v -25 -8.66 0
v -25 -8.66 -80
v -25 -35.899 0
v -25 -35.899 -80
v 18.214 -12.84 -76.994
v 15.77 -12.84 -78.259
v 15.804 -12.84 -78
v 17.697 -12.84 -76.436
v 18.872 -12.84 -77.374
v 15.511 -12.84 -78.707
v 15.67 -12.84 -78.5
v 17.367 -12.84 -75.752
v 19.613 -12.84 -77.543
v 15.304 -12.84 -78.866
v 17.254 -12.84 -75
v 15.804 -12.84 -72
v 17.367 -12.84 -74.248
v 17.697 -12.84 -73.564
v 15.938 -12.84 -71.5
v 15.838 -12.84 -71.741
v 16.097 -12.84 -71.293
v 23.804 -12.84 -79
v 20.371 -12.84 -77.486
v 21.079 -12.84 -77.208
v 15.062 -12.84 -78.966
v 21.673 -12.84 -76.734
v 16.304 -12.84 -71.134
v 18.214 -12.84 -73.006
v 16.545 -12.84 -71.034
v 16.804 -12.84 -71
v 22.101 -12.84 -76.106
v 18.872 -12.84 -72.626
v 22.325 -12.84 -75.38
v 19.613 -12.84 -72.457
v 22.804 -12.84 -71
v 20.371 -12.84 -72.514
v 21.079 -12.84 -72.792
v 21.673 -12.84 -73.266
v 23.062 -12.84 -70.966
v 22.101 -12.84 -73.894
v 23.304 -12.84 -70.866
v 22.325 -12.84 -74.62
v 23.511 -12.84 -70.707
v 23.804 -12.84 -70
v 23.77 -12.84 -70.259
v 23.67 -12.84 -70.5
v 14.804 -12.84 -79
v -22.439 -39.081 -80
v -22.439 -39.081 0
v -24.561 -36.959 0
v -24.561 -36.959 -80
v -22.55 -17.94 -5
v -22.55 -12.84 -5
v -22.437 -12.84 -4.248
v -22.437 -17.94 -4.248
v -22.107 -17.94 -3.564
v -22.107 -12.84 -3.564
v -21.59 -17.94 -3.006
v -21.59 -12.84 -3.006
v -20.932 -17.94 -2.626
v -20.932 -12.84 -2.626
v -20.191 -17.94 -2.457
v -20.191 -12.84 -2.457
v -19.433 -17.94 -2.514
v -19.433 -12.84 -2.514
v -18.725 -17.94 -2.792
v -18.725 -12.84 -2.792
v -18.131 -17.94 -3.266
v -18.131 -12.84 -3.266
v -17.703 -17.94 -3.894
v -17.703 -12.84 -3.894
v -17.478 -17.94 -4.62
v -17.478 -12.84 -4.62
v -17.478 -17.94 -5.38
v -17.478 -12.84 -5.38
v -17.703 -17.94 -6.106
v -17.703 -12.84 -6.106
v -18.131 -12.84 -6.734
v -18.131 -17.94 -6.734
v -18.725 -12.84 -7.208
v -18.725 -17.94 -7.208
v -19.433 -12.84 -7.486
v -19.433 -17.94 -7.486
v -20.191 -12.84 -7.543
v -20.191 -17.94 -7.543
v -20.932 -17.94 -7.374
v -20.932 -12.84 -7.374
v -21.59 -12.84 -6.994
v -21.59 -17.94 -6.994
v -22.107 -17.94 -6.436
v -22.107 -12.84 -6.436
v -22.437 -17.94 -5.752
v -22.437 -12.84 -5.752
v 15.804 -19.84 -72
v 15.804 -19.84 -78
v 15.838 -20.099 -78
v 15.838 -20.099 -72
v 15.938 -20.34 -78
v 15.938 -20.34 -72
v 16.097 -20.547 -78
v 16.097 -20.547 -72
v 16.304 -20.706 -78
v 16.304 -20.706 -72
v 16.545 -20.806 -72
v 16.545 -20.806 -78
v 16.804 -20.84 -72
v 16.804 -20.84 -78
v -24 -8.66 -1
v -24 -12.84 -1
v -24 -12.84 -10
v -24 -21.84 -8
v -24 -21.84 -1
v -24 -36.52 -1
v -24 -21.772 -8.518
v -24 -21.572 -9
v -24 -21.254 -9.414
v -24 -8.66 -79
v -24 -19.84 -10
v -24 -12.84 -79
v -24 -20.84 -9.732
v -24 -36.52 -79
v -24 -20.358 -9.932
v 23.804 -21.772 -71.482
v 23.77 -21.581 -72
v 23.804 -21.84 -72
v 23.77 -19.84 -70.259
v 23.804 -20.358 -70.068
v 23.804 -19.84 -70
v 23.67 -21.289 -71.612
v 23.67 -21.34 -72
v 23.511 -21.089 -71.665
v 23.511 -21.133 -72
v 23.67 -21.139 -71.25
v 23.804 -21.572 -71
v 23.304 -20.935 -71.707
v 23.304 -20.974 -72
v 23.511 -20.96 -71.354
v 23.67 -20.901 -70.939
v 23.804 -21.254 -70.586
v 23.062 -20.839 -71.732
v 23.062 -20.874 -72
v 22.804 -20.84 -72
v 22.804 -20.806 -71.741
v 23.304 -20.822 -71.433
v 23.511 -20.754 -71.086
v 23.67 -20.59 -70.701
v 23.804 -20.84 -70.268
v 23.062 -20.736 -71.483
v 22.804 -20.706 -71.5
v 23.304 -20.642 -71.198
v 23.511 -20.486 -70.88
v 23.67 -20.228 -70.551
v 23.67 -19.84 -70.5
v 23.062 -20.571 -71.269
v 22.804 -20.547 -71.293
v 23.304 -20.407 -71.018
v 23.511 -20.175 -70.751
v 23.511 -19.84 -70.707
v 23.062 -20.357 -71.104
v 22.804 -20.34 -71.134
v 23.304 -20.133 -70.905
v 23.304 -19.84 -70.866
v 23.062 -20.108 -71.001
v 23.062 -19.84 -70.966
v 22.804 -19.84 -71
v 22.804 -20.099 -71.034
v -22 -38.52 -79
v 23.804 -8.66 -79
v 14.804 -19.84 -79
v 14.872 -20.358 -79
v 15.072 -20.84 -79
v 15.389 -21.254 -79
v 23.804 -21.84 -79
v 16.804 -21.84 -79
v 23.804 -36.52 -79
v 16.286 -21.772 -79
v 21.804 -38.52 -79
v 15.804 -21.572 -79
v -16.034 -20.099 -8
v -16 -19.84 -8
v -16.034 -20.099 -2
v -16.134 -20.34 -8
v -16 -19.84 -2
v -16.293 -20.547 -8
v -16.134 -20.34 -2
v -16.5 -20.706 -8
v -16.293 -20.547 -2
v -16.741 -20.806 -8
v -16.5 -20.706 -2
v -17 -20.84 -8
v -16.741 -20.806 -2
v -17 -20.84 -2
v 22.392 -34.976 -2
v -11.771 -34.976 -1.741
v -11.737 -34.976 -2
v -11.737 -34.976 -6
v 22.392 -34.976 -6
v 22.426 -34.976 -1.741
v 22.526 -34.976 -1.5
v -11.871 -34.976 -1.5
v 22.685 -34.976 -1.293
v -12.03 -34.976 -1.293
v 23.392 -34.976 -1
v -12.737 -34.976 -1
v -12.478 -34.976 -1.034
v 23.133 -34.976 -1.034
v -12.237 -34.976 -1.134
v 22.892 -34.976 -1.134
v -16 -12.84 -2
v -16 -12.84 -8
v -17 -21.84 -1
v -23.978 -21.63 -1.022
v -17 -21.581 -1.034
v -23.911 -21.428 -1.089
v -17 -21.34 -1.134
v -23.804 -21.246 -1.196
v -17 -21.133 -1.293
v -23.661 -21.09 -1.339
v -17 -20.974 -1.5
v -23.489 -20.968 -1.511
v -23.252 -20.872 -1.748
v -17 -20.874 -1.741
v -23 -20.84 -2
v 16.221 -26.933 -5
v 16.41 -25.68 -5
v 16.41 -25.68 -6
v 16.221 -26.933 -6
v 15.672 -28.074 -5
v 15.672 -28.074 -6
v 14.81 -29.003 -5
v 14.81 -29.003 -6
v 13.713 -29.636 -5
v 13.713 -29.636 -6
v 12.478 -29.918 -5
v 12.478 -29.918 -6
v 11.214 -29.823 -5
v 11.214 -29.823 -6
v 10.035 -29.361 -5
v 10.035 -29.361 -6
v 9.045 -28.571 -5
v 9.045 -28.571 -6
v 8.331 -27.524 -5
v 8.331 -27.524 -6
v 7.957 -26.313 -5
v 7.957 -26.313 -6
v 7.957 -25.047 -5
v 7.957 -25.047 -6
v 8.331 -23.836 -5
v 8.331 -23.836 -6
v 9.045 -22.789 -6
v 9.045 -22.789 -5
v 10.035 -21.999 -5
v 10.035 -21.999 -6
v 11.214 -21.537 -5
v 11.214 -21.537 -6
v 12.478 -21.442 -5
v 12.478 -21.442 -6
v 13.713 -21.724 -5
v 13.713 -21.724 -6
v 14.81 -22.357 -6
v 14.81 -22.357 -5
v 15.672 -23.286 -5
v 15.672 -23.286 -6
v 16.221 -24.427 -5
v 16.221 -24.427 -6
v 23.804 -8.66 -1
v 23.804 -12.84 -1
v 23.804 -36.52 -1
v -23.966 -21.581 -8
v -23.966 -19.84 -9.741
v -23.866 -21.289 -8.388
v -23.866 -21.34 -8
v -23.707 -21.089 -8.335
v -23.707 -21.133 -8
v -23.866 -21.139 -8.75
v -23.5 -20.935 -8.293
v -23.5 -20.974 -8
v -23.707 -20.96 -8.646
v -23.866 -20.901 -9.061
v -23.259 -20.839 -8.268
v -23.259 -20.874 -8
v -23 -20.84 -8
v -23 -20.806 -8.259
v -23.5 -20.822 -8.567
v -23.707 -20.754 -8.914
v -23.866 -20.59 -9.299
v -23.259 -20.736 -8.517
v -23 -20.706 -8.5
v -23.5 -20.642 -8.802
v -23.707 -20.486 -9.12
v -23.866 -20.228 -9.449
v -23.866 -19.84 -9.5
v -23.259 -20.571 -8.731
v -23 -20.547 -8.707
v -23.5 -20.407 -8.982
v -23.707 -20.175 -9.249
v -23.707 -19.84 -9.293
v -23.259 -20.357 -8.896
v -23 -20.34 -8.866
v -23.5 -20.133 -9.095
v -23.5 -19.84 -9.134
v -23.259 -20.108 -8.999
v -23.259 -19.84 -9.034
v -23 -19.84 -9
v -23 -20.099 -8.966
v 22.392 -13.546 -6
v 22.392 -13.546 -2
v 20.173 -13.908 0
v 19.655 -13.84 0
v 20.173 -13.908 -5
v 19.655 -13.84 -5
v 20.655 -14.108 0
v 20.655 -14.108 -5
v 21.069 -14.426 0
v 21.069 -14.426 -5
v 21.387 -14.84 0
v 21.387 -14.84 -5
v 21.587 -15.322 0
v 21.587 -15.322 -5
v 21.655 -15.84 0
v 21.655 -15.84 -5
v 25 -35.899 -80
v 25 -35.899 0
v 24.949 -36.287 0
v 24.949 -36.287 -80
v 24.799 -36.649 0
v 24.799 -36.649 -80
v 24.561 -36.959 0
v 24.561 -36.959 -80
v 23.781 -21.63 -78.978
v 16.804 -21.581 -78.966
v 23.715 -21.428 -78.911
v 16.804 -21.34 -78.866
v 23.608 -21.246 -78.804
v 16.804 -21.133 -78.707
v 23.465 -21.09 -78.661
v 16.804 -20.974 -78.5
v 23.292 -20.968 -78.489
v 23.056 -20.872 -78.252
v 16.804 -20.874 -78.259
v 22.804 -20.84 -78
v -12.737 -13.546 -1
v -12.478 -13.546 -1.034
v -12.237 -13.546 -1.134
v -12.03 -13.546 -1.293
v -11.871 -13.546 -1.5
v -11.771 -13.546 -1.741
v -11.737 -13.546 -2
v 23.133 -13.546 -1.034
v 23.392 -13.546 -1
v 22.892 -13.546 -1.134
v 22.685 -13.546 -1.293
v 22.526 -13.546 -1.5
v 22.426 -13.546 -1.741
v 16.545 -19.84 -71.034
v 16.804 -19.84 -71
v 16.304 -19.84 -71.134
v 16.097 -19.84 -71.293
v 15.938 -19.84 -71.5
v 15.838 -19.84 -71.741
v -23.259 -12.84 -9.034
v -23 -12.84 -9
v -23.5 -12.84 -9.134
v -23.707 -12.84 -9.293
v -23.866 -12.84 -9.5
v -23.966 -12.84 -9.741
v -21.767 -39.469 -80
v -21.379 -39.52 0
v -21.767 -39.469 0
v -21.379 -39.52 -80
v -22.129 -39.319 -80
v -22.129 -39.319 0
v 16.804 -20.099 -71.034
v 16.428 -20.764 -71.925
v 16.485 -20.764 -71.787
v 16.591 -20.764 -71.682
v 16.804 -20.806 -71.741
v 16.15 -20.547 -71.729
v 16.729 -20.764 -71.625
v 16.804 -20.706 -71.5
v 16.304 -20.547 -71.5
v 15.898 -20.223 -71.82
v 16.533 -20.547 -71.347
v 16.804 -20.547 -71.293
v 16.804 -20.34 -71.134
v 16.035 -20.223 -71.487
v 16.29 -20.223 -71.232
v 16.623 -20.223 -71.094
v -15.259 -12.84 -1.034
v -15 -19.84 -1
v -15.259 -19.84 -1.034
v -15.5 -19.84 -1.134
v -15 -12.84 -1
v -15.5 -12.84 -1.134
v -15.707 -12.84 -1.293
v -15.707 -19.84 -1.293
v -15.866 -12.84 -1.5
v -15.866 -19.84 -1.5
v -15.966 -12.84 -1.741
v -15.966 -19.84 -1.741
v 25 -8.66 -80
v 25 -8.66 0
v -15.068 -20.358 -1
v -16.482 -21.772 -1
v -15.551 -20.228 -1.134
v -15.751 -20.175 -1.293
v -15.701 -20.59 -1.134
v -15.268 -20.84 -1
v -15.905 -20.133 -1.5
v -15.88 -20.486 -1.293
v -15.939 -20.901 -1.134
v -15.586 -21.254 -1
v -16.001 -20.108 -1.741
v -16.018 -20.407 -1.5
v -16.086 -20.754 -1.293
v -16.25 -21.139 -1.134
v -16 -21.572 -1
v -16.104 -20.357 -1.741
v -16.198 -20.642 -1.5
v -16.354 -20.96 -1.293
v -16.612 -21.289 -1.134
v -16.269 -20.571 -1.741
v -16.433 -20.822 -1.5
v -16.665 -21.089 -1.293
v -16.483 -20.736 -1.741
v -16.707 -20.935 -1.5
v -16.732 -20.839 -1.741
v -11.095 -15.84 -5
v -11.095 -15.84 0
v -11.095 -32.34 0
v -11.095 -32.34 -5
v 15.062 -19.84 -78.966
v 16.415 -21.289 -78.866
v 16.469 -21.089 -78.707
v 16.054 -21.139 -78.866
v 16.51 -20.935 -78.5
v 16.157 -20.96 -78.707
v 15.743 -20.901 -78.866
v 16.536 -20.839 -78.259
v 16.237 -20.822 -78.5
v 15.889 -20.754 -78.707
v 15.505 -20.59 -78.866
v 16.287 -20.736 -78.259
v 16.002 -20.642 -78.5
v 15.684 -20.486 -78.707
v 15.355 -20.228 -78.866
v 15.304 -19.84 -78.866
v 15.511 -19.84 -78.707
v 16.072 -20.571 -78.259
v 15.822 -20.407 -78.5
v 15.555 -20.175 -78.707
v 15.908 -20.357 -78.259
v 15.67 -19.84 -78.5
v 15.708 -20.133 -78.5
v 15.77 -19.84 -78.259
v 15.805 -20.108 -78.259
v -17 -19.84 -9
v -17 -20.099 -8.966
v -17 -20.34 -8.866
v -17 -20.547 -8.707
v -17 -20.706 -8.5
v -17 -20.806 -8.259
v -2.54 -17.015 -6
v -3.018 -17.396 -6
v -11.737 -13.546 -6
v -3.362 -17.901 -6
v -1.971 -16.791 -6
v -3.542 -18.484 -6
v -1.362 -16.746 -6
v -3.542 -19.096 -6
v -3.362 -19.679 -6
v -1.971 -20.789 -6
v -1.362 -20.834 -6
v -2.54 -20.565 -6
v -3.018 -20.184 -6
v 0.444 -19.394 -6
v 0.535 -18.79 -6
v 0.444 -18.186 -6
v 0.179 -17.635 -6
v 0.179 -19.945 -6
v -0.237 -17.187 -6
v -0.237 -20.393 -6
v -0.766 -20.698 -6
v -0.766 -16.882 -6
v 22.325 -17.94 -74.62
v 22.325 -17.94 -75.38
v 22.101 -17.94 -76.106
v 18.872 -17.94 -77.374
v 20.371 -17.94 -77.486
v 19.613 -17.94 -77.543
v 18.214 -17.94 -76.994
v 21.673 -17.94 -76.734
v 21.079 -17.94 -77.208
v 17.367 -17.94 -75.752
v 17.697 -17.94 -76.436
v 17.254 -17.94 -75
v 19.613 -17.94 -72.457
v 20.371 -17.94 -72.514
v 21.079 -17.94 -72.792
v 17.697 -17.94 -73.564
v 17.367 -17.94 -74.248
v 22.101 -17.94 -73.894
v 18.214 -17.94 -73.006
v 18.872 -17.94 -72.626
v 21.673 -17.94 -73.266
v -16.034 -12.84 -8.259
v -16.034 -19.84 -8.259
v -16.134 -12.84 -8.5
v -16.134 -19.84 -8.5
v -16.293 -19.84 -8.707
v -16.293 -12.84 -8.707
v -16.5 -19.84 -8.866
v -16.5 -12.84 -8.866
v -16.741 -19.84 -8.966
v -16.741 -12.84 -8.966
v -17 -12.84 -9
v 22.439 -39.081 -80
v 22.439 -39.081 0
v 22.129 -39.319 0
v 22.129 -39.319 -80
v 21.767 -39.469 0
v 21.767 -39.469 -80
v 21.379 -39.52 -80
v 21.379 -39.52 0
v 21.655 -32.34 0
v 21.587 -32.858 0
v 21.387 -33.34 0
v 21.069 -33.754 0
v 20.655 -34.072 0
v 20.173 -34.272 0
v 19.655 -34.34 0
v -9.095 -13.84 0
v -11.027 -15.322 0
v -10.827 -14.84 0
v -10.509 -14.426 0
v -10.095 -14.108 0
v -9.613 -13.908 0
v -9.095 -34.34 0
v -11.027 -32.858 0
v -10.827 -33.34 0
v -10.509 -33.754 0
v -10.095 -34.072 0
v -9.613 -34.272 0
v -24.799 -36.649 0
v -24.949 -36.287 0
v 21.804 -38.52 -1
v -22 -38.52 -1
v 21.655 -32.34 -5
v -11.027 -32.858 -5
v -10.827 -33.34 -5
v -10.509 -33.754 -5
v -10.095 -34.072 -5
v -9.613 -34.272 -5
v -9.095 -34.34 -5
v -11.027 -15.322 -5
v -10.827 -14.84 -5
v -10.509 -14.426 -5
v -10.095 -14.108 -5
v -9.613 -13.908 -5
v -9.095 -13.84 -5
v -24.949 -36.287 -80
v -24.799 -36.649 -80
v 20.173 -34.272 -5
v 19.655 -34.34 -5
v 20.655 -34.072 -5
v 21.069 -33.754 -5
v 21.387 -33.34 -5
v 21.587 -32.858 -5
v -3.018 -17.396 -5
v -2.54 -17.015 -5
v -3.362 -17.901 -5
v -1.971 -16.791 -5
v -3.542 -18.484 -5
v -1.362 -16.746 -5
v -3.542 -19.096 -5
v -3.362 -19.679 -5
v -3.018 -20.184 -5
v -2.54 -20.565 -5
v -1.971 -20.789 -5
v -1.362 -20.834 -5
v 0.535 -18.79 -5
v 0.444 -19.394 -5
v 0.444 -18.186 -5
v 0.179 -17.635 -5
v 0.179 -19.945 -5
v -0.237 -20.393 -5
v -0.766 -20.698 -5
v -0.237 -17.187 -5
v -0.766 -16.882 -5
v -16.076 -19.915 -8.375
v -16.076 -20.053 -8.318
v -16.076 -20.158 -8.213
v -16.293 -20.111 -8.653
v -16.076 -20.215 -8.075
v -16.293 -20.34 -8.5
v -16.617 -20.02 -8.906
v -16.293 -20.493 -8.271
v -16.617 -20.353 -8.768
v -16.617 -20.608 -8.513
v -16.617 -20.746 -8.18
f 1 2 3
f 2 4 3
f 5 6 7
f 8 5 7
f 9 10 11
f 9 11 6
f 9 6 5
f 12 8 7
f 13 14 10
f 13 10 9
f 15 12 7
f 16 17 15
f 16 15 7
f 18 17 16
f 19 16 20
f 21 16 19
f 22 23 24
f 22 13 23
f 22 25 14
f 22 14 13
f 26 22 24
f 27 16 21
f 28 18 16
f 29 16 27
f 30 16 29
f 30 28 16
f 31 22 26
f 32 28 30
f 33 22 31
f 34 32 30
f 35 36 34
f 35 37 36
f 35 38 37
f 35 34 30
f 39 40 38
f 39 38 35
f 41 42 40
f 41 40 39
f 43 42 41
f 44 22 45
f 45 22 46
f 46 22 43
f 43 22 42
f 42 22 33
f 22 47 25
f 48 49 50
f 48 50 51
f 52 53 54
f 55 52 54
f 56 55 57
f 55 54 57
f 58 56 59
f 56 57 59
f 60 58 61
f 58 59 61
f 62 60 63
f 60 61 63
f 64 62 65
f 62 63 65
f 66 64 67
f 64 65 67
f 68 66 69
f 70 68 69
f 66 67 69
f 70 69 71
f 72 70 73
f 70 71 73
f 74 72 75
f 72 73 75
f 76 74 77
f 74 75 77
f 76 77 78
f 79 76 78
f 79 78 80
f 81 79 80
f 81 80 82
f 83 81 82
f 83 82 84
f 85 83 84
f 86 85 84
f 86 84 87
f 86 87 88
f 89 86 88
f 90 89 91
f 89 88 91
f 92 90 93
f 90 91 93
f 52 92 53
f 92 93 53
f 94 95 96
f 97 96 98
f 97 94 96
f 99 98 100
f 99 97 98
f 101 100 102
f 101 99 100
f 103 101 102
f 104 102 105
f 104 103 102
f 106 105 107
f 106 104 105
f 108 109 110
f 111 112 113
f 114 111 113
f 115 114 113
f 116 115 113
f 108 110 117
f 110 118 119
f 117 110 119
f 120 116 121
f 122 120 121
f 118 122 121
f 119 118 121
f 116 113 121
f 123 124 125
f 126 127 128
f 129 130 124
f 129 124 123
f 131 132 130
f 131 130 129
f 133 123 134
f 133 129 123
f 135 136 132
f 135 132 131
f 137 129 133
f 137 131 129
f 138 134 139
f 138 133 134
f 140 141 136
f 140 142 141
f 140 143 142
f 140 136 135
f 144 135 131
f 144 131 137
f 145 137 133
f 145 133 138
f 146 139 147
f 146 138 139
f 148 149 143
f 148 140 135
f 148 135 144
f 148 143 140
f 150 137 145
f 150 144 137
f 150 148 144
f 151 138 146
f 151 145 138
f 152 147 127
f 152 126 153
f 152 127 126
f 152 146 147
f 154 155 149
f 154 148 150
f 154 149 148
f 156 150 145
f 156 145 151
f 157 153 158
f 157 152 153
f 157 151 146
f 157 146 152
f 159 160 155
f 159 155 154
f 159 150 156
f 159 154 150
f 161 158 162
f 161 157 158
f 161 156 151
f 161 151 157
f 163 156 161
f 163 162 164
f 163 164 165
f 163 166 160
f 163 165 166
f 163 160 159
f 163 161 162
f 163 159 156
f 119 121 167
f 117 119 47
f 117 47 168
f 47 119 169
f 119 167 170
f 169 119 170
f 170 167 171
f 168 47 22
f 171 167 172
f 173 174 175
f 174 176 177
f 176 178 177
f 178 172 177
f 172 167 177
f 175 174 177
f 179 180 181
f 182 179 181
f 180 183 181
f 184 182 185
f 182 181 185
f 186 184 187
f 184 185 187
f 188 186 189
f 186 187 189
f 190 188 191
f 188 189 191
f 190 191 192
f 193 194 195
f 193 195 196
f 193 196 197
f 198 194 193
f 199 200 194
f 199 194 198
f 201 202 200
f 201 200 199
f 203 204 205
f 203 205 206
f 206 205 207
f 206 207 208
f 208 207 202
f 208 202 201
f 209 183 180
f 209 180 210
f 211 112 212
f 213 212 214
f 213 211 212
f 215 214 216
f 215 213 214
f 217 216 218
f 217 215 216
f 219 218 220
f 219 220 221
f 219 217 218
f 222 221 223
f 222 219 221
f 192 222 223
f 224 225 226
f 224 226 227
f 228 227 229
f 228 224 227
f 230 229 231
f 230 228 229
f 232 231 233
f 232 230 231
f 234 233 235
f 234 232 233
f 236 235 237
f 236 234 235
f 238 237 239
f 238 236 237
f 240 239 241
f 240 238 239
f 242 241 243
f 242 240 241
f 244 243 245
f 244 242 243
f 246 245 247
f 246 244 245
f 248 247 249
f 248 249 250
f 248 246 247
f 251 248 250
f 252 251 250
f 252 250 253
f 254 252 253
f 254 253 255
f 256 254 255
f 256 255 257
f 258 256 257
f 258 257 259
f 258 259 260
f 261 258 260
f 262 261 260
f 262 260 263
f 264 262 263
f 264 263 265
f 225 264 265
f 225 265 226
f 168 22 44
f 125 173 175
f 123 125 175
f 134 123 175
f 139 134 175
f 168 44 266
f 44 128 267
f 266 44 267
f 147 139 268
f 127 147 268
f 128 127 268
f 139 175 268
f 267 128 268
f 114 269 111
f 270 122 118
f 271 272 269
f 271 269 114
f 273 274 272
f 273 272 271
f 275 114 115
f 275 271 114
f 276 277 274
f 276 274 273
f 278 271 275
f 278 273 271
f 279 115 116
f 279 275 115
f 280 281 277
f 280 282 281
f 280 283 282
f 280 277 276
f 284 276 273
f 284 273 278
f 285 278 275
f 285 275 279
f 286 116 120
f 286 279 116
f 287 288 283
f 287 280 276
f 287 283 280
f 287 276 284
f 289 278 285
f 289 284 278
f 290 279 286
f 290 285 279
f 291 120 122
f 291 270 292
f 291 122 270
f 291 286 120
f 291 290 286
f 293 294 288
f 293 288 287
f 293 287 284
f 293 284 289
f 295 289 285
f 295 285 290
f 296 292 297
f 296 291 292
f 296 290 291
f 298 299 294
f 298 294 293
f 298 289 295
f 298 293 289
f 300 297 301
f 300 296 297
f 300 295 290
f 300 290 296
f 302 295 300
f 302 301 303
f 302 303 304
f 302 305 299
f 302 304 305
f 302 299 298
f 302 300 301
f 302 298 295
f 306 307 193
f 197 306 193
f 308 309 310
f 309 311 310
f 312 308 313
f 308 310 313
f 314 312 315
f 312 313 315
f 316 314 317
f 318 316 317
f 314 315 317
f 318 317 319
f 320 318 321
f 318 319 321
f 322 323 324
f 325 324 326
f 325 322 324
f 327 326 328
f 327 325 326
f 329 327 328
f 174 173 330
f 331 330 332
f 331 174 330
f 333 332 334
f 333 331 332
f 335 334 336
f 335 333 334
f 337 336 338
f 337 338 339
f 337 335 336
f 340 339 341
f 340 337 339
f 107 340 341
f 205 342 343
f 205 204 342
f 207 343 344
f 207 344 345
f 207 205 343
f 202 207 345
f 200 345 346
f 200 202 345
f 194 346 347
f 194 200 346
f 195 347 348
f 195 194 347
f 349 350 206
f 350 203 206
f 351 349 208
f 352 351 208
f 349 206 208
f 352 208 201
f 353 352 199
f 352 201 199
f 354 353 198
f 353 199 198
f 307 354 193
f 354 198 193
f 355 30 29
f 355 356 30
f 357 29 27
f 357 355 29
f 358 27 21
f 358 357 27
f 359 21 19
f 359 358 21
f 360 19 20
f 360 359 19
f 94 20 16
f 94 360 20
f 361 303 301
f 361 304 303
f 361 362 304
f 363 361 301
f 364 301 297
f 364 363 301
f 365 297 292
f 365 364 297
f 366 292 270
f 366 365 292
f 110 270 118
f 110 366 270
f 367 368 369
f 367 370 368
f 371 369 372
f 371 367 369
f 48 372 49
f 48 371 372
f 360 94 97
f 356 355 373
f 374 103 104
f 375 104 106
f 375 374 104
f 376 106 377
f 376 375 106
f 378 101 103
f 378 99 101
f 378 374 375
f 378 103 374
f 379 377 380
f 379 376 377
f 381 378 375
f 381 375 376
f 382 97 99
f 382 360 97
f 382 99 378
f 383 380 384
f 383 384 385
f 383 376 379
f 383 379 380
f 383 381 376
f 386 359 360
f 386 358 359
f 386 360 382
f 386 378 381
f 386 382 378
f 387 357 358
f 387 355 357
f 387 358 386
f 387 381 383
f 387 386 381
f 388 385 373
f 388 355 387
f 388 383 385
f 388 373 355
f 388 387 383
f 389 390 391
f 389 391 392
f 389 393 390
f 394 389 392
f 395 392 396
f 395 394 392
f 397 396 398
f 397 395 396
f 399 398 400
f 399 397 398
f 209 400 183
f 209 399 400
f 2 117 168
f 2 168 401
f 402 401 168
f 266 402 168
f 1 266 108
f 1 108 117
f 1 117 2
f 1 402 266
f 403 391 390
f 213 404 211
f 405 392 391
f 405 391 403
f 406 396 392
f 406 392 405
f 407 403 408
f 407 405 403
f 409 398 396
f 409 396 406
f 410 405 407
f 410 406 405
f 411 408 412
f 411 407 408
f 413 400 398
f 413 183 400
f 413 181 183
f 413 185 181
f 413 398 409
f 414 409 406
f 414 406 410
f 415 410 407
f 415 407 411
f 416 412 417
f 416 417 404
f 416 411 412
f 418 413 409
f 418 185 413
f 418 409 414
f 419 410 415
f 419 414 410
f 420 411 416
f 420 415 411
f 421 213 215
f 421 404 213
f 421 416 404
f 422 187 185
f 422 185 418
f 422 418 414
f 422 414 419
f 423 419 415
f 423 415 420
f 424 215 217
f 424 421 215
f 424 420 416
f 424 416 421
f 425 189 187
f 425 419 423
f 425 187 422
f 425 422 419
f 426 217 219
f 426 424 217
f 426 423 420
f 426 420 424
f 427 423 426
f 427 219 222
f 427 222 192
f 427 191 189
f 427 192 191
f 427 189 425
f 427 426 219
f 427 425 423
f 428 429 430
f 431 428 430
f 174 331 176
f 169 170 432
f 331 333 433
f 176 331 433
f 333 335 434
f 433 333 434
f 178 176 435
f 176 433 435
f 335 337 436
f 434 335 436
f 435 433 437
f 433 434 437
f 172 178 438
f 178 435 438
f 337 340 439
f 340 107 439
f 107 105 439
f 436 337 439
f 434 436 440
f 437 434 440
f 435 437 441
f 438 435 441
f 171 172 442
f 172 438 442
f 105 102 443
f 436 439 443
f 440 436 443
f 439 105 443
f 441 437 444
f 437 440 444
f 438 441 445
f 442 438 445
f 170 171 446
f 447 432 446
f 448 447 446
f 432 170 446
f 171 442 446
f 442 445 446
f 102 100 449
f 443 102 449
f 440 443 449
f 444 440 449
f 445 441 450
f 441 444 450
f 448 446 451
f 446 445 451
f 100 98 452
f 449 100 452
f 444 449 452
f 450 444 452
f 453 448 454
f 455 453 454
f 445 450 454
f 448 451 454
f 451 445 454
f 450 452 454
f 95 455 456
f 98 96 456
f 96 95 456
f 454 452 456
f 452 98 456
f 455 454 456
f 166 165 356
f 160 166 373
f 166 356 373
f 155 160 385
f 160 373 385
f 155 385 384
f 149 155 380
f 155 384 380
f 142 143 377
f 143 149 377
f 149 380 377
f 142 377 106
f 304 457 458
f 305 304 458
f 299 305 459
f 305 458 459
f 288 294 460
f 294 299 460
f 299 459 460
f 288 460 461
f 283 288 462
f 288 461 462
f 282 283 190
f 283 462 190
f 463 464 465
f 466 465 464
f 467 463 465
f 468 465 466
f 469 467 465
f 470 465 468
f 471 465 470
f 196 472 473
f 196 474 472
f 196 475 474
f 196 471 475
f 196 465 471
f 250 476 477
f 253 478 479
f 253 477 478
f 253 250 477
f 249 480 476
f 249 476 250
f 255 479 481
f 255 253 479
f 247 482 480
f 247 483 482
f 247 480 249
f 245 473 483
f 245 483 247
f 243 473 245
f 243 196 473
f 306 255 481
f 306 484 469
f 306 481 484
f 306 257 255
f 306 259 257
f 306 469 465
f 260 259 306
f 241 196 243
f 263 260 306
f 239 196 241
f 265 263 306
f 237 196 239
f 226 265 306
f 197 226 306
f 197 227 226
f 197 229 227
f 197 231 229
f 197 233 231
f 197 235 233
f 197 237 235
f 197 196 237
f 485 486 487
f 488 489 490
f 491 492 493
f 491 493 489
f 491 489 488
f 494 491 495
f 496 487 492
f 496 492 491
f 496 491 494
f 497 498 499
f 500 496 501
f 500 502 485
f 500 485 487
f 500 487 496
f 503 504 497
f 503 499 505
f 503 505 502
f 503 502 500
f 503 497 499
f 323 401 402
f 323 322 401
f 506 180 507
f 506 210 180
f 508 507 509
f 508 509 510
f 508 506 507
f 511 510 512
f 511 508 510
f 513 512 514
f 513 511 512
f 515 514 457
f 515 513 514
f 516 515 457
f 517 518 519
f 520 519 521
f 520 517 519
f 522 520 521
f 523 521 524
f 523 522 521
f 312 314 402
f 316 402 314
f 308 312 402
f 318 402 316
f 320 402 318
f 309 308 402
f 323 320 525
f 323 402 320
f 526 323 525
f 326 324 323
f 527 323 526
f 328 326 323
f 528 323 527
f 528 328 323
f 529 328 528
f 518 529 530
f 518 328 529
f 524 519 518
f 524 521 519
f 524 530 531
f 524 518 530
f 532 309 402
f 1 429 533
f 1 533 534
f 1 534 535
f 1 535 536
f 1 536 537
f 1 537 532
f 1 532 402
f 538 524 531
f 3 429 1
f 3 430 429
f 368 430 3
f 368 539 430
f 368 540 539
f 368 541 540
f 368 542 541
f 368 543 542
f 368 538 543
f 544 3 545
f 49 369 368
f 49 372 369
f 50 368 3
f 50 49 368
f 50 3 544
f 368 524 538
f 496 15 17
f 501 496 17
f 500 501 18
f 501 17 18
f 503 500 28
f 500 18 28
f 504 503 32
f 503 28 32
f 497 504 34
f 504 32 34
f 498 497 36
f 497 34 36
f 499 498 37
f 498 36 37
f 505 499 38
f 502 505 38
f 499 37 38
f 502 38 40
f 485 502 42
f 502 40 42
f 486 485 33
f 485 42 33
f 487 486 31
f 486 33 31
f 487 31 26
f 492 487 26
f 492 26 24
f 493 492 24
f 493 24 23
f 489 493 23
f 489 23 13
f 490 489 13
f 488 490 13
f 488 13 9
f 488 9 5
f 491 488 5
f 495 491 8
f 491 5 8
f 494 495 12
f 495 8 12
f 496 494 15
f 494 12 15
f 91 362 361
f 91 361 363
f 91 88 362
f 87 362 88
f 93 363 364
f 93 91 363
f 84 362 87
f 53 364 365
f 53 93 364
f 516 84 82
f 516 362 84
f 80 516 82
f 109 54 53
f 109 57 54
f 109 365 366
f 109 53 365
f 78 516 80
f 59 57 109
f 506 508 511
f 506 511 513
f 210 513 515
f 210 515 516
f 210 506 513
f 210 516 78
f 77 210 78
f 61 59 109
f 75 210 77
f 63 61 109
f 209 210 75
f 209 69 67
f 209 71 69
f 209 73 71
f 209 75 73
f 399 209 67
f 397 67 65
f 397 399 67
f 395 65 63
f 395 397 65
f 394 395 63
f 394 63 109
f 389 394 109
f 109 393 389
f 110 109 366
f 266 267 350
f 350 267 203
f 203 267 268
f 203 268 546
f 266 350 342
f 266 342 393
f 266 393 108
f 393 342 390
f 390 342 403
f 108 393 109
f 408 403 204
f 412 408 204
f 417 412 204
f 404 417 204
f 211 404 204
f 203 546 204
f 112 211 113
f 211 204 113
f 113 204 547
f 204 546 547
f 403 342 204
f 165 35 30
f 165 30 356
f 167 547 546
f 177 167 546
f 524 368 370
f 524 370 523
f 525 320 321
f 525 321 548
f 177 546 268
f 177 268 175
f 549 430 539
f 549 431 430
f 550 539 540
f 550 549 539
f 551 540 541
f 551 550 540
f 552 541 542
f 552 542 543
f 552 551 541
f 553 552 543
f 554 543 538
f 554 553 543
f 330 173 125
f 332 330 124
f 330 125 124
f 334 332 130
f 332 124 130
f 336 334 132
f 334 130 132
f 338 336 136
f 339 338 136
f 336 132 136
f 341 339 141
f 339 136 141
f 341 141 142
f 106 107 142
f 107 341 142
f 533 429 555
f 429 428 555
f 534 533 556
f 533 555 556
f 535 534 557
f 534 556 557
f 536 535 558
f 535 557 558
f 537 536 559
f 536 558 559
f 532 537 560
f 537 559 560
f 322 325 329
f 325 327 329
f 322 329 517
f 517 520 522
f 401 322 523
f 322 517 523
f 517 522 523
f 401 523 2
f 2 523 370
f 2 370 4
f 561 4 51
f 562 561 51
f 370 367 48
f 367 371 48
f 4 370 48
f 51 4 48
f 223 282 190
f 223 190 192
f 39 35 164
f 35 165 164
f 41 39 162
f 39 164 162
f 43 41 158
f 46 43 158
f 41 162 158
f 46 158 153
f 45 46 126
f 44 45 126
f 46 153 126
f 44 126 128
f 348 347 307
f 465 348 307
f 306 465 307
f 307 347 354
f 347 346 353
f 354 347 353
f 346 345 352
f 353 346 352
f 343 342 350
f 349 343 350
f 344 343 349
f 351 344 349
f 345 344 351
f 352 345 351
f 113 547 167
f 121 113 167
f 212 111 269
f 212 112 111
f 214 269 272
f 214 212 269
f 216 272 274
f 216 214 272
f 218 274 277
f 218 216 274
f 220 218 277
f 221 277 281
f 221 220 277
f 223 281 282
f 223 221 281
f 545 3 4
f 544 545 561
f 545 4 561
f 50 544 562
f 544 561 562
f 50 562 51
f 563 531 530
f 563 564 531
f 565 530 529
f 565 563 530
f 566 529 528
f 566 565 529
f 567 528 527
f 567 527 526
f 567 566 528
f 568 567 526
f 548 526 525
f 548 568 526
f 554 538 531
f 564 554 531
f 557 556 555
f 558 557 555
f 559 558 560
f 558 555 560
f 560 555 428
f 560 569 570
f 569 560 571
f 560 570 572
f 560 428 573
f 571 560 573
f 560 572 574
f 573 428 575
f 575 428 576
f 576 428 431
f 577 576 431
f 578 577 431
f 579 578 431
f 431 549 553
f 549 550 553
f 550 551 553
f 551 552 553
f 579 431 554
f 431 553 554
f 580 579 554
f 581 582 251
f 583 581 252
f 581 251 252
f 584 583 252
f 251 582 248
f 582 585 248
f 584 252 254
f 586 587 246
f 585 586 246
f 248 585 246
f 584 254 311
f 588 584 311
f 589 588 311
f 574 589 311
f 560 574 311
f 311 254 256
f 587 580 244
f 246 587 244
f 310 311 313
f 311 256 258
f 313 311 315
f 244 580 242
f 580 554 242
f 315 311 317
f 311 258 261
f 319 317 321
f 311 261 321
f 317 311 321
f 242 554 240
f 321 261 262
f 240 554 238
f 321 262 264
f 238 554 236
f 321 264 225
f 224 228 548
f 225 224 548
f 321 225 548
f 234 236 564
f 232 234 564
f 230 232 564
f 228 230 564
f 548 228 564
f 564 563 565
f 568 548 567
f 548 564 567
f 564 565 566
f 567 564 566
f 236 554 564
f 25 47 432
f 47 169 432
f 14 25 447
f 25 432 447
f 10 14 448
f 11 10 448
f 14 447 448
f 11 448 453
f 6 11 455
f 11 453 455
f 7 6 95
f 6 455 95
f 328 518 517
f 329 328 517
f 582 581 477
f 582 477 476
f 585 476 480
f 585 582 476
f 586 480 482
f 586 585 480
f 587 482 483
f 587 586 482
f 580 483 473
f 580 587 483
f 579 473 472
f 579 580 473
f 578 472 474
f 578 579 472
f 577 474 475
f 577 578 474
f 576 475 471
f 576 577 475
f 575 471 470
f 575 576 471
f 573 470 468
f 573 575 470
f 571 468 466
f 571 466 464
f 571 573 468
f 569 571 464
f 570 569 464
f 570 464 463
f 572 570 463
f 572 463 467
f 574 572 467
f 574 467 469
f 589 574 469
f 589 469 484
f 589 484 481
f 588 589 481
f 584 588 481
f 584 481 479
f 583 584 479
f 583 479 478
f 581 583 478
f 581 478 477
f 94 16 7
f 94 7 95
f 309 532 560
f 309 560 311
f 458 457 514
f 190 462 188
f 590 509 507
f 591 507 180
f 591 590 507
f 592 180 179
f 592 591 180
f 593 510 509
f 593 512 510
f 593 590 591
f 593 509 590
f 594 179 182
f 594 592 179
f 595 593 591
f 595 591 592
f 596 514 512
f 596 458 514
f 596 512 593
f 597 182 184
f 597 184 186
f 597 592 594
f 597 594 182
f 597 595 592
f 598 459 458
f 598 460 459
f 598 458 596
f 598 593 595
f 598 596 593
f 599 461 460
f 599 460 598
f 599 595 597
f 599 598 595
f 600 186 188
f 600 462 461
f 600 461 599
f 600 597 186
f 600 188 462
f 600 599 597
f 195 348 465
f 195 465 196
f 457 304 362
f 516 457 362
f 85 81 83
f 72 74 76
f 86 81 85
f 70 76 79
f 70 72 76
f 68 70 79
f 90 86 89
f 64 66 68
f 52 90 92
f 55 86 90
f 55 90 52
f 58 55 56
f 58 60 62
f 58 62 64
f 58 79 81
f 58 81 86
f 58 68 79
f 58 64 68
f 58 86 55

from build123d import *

# Parameters (mm, degrees)
F1_W      = 50
F1_H      = 27.68
F1_W_2    = 47.8036555797
F1_H_2    = 25.68
F2_DEPTH  = 80
F1_W_3    = 34.129309468
F1_H_3    = 21.4303236678
F1_W_4    = 32.75
F1_H_4    = 20.5
F3_DEPTH  = 6
F0_W      = 32.75
F0_H      = 20.5
F0_R      = 2.05
F0_R_2    = 4.25
F4_DEPTH  = 6
F5_DEPTH  = 5
F6_DEPTH  = 1
F7_R      = 2
F8_W      = 50
F8_H      = 80
F9_DEPTH  = 1
F10_ANGLE = 180
F11_W     = 47.8036555797
F11_H     = 25.68
F12_DEPTH = 1
F13_W     = 8
F13_H     = 8
F14_DEPTH = 8
F15_W     = 8
F15_H     = 8
F16_DEPTH = 8
F19_SIZE  = 2
F20_SIZE  = 3
F21_R     = 1.5
F22_R     = 1
F18_R     = 2.55
F23_DEPTH = 5.1
F24_W     = 50
F24_H     = 80
F25_DEPTH = 4.18


with BuildPart() as f2:
    # F1 (on face) → F2 (new body)
    with BuildSketch(Plane.XY):
        Rectangle(F1_W, F1_H)
        with Locations((-0.0981722102, 0)):
            Rectangle(F1_W_2, F1_H_2, mode=Mode.SUBTRACT)
    extrude(amount=F2_DEPTH)

    # F8 (on face) → F9 (cut)
    with BuildSketch(Plane.XZ.offset(13.84)):
        with Locations((0, 40)):
            Rectangle(F8_W, F8_H)
    extrude(amount=-F9_DEPTH, mode=Mode.SUBTRACT)


with BuildPart() as f3:
    # F1 (on face) → F3 (new body)
    with BuildSketch(Plane.XY):
        with Locations((5.3276410885, -1.4191564249)):
            Rectangle(F1_W_3, F1_H_3)
        with Locations((5.28, -1.59)):
            Rectangle(F1_W_4, F1_H_4, mode=Mode.SUBTRACT)
    extrude(amount=F3_DEPTH)

    # F0 (on Top) → F4 (join)
    with BuildSketch(Plane.XY):
        with Locations((5.28, -1.59)):
            Rectangle(F0_W, F0_H)
        with Locations((-1.515, -6.89)):
            Circle(F0_R, mode=Mode.SUBTRACT)
        with Locations((12.16, 0)):
            Circle(F0_R_2, mode=Mode.SUBTRACT)
    extrude(amount=F4_DEPTH)

    # F1 (on face) → F5 (cut)
    with BuildSketch(Plane.XY):
        with Locations((5.28, -1.59)):
            Rectangle(F1_W_4, F1_H_4)
    extrude(amount=F5_DEPTH, mode=Mode.SUBTRACT)

    # F7
    f7_edges = [f3.edges().sort_by_distance(p)[0] for p in [
        (21.655, -11.84, 2.5),
        (-11.095, -11.84, 2.5),
        (21.655, 8.66, 2.5),
        (-11.095, 8.66, 2.5),
    ]]
    fillet(f7_edges, radius=F7_R)


with BuildPart() as f6:
    # F1 (on face) → F6 (new body)
    with BuildSketch(Plane.XY):
        with Locations((-0.0981722102, 0)):
            Rectangle(F1_W_2, F1_H_2)
        with Locations((5.3276410885, -1.4191564249)):
            Rectangle(F1_W_3, F1_H_3, mode=Mode.SUBTRACT)
    extrude(amount=F6_DEPTH)


with BuildPart() as f6_1:
    # F10: moved
    add(f6.part.rotate(Axis((-0.0981722102, -12.84, 0), (1, 0, 0)), F10_ANGLE))


with BuildPart() as f2_1:
    # F10: moved
    add(f2.part.rotate(Axis((-0.0981722102, -12.84, 0), (1, 0, 0)), F10_ANGLE))

    # F11 (on face) → F12 (join)
    with BuildSketch(Plane(origin=(0, 0, -80), x_dir=(1, 0, 0), z_dir=(0, 0, -1))):
        with Locations((-0.0981722102, 25.68)):
            Rectangle(F11_W, F11_H)
    extrude(amount=-F12_DEPTH)


    add(f6_1.part)  # F14 merges F6
    # F13 (on face) → F14 (join)
    with BuildSketch(Plane.YZ.offset(-24)):
        with Locations((-16.84, -5)):
            Rectangle(F13_W, F13_H)
    extrude(amount=F14_DEPTH)

    # F15 (on face) → F16 (join)
    with BuildSketch(Plane(origin=(23.8036555797, 0, 0), x_dir=(0, -1, 0), z_dir=(-1, 0, 0))):
        with Locations((16.84, -75)):
            Rectangle(F15_W, F15_H)
    extrude(amount=F16_DEPTH)


with BuildPart() as f3_1:
    # F10: moved
    add(f3.part.rotate(Axis((-0.0981722102, -12.84, 0), (1, 0, 0)), F10_ANGLE))


with BuildPart() as f2_2:
    add(f2_1.part)

    # F17: union F3
    add(f3_1.part)

    # F19
    f19_edges = [f2_2.edges().sort_by_distance(p)[0] for p in [
        (23.803656, -38.52, -40),
        (-24, -38.52, -40),
    ]]
    chamfer(f19_edges, length=F19_SIZE)

    # F20
    f20_edges = [f2_2.edges().sort_by_distance(p)[0] for p in [
        (-25, -39.52, -40),
        (25, -39.52, -40),
    ]]
    chamfer(f20_edges, length=F20_SIZE)

    # F21
    f21_edges = [f2_2.edges().sort_by_distance(p)[0] for p in [
        (25, -36.52, -40),
        (22, -39.52, -40),
        (-22, -39.52, -40),
        (-25, -36.52, -40),
    ]]
    fillet(f21_edges, radius=F21_R)

    # F22
    f22_edges = [f2_2.edges().sort_by_distance(p)[0] for p in [
        (-24, -16.84, -9),
        (-20, -20.84, -9),
        (-16, -16.84, -9),
        (-16, -20.84, -5),
        (-16, -16.84, -1),
        (15.803656, -16.84, -71),
        (23.803656, -16.84, -71),
        (15.803656, -16.84, -79),
        (15.803656, -20.84, -75),
        (19.803656, -20.84, -71),
        (-11.737014, -24.260844, -1),
        (22.392296, -24.260844, -1),
        (-20, -20.84, -1),
        (23.803656, -20.84, -75),
        (19.803656, -20.84, -79),
        (-24, -20.84, -5),
    ]]
    fillet(f22_edges, radius=F22_R)

    # F18 (on face) → F23 (cut)
    with BuildSketch(Plane(origin=(0, -12.84, 0), x_dir=(-1, 0, 0), z_dir=(0, 1, 0))):
        with Locations((20, -5)):
            Circle(F18_R)
        with Locations((-19.8036555797, -75)):
            Circle(F18_R)
    extrude(amount=-F23_DEPTH, mode=Mode.SUBTRACT)

    # F24 (on face) → F25 (join)
    with BuildSketch(Plane(origin=(0, -12.84, 0), x_dir=(-1, 0, 0), z_dir=(0, 1, 0))):
        with Locations((0, -40)):
            Rectangle(F24_W, F24_H)
        Polygon((-23.8036555797, -70), (-23.8036555797, -1), (15, -1), (24, -1), (24, -10), (24, -79), (-14.8036555797, -79), (-23.8036555797, -79), align=None, mode=Mode.SUBTRACT)
    extrude(amount=F25_DEPTH)


solid = f2_2.part
